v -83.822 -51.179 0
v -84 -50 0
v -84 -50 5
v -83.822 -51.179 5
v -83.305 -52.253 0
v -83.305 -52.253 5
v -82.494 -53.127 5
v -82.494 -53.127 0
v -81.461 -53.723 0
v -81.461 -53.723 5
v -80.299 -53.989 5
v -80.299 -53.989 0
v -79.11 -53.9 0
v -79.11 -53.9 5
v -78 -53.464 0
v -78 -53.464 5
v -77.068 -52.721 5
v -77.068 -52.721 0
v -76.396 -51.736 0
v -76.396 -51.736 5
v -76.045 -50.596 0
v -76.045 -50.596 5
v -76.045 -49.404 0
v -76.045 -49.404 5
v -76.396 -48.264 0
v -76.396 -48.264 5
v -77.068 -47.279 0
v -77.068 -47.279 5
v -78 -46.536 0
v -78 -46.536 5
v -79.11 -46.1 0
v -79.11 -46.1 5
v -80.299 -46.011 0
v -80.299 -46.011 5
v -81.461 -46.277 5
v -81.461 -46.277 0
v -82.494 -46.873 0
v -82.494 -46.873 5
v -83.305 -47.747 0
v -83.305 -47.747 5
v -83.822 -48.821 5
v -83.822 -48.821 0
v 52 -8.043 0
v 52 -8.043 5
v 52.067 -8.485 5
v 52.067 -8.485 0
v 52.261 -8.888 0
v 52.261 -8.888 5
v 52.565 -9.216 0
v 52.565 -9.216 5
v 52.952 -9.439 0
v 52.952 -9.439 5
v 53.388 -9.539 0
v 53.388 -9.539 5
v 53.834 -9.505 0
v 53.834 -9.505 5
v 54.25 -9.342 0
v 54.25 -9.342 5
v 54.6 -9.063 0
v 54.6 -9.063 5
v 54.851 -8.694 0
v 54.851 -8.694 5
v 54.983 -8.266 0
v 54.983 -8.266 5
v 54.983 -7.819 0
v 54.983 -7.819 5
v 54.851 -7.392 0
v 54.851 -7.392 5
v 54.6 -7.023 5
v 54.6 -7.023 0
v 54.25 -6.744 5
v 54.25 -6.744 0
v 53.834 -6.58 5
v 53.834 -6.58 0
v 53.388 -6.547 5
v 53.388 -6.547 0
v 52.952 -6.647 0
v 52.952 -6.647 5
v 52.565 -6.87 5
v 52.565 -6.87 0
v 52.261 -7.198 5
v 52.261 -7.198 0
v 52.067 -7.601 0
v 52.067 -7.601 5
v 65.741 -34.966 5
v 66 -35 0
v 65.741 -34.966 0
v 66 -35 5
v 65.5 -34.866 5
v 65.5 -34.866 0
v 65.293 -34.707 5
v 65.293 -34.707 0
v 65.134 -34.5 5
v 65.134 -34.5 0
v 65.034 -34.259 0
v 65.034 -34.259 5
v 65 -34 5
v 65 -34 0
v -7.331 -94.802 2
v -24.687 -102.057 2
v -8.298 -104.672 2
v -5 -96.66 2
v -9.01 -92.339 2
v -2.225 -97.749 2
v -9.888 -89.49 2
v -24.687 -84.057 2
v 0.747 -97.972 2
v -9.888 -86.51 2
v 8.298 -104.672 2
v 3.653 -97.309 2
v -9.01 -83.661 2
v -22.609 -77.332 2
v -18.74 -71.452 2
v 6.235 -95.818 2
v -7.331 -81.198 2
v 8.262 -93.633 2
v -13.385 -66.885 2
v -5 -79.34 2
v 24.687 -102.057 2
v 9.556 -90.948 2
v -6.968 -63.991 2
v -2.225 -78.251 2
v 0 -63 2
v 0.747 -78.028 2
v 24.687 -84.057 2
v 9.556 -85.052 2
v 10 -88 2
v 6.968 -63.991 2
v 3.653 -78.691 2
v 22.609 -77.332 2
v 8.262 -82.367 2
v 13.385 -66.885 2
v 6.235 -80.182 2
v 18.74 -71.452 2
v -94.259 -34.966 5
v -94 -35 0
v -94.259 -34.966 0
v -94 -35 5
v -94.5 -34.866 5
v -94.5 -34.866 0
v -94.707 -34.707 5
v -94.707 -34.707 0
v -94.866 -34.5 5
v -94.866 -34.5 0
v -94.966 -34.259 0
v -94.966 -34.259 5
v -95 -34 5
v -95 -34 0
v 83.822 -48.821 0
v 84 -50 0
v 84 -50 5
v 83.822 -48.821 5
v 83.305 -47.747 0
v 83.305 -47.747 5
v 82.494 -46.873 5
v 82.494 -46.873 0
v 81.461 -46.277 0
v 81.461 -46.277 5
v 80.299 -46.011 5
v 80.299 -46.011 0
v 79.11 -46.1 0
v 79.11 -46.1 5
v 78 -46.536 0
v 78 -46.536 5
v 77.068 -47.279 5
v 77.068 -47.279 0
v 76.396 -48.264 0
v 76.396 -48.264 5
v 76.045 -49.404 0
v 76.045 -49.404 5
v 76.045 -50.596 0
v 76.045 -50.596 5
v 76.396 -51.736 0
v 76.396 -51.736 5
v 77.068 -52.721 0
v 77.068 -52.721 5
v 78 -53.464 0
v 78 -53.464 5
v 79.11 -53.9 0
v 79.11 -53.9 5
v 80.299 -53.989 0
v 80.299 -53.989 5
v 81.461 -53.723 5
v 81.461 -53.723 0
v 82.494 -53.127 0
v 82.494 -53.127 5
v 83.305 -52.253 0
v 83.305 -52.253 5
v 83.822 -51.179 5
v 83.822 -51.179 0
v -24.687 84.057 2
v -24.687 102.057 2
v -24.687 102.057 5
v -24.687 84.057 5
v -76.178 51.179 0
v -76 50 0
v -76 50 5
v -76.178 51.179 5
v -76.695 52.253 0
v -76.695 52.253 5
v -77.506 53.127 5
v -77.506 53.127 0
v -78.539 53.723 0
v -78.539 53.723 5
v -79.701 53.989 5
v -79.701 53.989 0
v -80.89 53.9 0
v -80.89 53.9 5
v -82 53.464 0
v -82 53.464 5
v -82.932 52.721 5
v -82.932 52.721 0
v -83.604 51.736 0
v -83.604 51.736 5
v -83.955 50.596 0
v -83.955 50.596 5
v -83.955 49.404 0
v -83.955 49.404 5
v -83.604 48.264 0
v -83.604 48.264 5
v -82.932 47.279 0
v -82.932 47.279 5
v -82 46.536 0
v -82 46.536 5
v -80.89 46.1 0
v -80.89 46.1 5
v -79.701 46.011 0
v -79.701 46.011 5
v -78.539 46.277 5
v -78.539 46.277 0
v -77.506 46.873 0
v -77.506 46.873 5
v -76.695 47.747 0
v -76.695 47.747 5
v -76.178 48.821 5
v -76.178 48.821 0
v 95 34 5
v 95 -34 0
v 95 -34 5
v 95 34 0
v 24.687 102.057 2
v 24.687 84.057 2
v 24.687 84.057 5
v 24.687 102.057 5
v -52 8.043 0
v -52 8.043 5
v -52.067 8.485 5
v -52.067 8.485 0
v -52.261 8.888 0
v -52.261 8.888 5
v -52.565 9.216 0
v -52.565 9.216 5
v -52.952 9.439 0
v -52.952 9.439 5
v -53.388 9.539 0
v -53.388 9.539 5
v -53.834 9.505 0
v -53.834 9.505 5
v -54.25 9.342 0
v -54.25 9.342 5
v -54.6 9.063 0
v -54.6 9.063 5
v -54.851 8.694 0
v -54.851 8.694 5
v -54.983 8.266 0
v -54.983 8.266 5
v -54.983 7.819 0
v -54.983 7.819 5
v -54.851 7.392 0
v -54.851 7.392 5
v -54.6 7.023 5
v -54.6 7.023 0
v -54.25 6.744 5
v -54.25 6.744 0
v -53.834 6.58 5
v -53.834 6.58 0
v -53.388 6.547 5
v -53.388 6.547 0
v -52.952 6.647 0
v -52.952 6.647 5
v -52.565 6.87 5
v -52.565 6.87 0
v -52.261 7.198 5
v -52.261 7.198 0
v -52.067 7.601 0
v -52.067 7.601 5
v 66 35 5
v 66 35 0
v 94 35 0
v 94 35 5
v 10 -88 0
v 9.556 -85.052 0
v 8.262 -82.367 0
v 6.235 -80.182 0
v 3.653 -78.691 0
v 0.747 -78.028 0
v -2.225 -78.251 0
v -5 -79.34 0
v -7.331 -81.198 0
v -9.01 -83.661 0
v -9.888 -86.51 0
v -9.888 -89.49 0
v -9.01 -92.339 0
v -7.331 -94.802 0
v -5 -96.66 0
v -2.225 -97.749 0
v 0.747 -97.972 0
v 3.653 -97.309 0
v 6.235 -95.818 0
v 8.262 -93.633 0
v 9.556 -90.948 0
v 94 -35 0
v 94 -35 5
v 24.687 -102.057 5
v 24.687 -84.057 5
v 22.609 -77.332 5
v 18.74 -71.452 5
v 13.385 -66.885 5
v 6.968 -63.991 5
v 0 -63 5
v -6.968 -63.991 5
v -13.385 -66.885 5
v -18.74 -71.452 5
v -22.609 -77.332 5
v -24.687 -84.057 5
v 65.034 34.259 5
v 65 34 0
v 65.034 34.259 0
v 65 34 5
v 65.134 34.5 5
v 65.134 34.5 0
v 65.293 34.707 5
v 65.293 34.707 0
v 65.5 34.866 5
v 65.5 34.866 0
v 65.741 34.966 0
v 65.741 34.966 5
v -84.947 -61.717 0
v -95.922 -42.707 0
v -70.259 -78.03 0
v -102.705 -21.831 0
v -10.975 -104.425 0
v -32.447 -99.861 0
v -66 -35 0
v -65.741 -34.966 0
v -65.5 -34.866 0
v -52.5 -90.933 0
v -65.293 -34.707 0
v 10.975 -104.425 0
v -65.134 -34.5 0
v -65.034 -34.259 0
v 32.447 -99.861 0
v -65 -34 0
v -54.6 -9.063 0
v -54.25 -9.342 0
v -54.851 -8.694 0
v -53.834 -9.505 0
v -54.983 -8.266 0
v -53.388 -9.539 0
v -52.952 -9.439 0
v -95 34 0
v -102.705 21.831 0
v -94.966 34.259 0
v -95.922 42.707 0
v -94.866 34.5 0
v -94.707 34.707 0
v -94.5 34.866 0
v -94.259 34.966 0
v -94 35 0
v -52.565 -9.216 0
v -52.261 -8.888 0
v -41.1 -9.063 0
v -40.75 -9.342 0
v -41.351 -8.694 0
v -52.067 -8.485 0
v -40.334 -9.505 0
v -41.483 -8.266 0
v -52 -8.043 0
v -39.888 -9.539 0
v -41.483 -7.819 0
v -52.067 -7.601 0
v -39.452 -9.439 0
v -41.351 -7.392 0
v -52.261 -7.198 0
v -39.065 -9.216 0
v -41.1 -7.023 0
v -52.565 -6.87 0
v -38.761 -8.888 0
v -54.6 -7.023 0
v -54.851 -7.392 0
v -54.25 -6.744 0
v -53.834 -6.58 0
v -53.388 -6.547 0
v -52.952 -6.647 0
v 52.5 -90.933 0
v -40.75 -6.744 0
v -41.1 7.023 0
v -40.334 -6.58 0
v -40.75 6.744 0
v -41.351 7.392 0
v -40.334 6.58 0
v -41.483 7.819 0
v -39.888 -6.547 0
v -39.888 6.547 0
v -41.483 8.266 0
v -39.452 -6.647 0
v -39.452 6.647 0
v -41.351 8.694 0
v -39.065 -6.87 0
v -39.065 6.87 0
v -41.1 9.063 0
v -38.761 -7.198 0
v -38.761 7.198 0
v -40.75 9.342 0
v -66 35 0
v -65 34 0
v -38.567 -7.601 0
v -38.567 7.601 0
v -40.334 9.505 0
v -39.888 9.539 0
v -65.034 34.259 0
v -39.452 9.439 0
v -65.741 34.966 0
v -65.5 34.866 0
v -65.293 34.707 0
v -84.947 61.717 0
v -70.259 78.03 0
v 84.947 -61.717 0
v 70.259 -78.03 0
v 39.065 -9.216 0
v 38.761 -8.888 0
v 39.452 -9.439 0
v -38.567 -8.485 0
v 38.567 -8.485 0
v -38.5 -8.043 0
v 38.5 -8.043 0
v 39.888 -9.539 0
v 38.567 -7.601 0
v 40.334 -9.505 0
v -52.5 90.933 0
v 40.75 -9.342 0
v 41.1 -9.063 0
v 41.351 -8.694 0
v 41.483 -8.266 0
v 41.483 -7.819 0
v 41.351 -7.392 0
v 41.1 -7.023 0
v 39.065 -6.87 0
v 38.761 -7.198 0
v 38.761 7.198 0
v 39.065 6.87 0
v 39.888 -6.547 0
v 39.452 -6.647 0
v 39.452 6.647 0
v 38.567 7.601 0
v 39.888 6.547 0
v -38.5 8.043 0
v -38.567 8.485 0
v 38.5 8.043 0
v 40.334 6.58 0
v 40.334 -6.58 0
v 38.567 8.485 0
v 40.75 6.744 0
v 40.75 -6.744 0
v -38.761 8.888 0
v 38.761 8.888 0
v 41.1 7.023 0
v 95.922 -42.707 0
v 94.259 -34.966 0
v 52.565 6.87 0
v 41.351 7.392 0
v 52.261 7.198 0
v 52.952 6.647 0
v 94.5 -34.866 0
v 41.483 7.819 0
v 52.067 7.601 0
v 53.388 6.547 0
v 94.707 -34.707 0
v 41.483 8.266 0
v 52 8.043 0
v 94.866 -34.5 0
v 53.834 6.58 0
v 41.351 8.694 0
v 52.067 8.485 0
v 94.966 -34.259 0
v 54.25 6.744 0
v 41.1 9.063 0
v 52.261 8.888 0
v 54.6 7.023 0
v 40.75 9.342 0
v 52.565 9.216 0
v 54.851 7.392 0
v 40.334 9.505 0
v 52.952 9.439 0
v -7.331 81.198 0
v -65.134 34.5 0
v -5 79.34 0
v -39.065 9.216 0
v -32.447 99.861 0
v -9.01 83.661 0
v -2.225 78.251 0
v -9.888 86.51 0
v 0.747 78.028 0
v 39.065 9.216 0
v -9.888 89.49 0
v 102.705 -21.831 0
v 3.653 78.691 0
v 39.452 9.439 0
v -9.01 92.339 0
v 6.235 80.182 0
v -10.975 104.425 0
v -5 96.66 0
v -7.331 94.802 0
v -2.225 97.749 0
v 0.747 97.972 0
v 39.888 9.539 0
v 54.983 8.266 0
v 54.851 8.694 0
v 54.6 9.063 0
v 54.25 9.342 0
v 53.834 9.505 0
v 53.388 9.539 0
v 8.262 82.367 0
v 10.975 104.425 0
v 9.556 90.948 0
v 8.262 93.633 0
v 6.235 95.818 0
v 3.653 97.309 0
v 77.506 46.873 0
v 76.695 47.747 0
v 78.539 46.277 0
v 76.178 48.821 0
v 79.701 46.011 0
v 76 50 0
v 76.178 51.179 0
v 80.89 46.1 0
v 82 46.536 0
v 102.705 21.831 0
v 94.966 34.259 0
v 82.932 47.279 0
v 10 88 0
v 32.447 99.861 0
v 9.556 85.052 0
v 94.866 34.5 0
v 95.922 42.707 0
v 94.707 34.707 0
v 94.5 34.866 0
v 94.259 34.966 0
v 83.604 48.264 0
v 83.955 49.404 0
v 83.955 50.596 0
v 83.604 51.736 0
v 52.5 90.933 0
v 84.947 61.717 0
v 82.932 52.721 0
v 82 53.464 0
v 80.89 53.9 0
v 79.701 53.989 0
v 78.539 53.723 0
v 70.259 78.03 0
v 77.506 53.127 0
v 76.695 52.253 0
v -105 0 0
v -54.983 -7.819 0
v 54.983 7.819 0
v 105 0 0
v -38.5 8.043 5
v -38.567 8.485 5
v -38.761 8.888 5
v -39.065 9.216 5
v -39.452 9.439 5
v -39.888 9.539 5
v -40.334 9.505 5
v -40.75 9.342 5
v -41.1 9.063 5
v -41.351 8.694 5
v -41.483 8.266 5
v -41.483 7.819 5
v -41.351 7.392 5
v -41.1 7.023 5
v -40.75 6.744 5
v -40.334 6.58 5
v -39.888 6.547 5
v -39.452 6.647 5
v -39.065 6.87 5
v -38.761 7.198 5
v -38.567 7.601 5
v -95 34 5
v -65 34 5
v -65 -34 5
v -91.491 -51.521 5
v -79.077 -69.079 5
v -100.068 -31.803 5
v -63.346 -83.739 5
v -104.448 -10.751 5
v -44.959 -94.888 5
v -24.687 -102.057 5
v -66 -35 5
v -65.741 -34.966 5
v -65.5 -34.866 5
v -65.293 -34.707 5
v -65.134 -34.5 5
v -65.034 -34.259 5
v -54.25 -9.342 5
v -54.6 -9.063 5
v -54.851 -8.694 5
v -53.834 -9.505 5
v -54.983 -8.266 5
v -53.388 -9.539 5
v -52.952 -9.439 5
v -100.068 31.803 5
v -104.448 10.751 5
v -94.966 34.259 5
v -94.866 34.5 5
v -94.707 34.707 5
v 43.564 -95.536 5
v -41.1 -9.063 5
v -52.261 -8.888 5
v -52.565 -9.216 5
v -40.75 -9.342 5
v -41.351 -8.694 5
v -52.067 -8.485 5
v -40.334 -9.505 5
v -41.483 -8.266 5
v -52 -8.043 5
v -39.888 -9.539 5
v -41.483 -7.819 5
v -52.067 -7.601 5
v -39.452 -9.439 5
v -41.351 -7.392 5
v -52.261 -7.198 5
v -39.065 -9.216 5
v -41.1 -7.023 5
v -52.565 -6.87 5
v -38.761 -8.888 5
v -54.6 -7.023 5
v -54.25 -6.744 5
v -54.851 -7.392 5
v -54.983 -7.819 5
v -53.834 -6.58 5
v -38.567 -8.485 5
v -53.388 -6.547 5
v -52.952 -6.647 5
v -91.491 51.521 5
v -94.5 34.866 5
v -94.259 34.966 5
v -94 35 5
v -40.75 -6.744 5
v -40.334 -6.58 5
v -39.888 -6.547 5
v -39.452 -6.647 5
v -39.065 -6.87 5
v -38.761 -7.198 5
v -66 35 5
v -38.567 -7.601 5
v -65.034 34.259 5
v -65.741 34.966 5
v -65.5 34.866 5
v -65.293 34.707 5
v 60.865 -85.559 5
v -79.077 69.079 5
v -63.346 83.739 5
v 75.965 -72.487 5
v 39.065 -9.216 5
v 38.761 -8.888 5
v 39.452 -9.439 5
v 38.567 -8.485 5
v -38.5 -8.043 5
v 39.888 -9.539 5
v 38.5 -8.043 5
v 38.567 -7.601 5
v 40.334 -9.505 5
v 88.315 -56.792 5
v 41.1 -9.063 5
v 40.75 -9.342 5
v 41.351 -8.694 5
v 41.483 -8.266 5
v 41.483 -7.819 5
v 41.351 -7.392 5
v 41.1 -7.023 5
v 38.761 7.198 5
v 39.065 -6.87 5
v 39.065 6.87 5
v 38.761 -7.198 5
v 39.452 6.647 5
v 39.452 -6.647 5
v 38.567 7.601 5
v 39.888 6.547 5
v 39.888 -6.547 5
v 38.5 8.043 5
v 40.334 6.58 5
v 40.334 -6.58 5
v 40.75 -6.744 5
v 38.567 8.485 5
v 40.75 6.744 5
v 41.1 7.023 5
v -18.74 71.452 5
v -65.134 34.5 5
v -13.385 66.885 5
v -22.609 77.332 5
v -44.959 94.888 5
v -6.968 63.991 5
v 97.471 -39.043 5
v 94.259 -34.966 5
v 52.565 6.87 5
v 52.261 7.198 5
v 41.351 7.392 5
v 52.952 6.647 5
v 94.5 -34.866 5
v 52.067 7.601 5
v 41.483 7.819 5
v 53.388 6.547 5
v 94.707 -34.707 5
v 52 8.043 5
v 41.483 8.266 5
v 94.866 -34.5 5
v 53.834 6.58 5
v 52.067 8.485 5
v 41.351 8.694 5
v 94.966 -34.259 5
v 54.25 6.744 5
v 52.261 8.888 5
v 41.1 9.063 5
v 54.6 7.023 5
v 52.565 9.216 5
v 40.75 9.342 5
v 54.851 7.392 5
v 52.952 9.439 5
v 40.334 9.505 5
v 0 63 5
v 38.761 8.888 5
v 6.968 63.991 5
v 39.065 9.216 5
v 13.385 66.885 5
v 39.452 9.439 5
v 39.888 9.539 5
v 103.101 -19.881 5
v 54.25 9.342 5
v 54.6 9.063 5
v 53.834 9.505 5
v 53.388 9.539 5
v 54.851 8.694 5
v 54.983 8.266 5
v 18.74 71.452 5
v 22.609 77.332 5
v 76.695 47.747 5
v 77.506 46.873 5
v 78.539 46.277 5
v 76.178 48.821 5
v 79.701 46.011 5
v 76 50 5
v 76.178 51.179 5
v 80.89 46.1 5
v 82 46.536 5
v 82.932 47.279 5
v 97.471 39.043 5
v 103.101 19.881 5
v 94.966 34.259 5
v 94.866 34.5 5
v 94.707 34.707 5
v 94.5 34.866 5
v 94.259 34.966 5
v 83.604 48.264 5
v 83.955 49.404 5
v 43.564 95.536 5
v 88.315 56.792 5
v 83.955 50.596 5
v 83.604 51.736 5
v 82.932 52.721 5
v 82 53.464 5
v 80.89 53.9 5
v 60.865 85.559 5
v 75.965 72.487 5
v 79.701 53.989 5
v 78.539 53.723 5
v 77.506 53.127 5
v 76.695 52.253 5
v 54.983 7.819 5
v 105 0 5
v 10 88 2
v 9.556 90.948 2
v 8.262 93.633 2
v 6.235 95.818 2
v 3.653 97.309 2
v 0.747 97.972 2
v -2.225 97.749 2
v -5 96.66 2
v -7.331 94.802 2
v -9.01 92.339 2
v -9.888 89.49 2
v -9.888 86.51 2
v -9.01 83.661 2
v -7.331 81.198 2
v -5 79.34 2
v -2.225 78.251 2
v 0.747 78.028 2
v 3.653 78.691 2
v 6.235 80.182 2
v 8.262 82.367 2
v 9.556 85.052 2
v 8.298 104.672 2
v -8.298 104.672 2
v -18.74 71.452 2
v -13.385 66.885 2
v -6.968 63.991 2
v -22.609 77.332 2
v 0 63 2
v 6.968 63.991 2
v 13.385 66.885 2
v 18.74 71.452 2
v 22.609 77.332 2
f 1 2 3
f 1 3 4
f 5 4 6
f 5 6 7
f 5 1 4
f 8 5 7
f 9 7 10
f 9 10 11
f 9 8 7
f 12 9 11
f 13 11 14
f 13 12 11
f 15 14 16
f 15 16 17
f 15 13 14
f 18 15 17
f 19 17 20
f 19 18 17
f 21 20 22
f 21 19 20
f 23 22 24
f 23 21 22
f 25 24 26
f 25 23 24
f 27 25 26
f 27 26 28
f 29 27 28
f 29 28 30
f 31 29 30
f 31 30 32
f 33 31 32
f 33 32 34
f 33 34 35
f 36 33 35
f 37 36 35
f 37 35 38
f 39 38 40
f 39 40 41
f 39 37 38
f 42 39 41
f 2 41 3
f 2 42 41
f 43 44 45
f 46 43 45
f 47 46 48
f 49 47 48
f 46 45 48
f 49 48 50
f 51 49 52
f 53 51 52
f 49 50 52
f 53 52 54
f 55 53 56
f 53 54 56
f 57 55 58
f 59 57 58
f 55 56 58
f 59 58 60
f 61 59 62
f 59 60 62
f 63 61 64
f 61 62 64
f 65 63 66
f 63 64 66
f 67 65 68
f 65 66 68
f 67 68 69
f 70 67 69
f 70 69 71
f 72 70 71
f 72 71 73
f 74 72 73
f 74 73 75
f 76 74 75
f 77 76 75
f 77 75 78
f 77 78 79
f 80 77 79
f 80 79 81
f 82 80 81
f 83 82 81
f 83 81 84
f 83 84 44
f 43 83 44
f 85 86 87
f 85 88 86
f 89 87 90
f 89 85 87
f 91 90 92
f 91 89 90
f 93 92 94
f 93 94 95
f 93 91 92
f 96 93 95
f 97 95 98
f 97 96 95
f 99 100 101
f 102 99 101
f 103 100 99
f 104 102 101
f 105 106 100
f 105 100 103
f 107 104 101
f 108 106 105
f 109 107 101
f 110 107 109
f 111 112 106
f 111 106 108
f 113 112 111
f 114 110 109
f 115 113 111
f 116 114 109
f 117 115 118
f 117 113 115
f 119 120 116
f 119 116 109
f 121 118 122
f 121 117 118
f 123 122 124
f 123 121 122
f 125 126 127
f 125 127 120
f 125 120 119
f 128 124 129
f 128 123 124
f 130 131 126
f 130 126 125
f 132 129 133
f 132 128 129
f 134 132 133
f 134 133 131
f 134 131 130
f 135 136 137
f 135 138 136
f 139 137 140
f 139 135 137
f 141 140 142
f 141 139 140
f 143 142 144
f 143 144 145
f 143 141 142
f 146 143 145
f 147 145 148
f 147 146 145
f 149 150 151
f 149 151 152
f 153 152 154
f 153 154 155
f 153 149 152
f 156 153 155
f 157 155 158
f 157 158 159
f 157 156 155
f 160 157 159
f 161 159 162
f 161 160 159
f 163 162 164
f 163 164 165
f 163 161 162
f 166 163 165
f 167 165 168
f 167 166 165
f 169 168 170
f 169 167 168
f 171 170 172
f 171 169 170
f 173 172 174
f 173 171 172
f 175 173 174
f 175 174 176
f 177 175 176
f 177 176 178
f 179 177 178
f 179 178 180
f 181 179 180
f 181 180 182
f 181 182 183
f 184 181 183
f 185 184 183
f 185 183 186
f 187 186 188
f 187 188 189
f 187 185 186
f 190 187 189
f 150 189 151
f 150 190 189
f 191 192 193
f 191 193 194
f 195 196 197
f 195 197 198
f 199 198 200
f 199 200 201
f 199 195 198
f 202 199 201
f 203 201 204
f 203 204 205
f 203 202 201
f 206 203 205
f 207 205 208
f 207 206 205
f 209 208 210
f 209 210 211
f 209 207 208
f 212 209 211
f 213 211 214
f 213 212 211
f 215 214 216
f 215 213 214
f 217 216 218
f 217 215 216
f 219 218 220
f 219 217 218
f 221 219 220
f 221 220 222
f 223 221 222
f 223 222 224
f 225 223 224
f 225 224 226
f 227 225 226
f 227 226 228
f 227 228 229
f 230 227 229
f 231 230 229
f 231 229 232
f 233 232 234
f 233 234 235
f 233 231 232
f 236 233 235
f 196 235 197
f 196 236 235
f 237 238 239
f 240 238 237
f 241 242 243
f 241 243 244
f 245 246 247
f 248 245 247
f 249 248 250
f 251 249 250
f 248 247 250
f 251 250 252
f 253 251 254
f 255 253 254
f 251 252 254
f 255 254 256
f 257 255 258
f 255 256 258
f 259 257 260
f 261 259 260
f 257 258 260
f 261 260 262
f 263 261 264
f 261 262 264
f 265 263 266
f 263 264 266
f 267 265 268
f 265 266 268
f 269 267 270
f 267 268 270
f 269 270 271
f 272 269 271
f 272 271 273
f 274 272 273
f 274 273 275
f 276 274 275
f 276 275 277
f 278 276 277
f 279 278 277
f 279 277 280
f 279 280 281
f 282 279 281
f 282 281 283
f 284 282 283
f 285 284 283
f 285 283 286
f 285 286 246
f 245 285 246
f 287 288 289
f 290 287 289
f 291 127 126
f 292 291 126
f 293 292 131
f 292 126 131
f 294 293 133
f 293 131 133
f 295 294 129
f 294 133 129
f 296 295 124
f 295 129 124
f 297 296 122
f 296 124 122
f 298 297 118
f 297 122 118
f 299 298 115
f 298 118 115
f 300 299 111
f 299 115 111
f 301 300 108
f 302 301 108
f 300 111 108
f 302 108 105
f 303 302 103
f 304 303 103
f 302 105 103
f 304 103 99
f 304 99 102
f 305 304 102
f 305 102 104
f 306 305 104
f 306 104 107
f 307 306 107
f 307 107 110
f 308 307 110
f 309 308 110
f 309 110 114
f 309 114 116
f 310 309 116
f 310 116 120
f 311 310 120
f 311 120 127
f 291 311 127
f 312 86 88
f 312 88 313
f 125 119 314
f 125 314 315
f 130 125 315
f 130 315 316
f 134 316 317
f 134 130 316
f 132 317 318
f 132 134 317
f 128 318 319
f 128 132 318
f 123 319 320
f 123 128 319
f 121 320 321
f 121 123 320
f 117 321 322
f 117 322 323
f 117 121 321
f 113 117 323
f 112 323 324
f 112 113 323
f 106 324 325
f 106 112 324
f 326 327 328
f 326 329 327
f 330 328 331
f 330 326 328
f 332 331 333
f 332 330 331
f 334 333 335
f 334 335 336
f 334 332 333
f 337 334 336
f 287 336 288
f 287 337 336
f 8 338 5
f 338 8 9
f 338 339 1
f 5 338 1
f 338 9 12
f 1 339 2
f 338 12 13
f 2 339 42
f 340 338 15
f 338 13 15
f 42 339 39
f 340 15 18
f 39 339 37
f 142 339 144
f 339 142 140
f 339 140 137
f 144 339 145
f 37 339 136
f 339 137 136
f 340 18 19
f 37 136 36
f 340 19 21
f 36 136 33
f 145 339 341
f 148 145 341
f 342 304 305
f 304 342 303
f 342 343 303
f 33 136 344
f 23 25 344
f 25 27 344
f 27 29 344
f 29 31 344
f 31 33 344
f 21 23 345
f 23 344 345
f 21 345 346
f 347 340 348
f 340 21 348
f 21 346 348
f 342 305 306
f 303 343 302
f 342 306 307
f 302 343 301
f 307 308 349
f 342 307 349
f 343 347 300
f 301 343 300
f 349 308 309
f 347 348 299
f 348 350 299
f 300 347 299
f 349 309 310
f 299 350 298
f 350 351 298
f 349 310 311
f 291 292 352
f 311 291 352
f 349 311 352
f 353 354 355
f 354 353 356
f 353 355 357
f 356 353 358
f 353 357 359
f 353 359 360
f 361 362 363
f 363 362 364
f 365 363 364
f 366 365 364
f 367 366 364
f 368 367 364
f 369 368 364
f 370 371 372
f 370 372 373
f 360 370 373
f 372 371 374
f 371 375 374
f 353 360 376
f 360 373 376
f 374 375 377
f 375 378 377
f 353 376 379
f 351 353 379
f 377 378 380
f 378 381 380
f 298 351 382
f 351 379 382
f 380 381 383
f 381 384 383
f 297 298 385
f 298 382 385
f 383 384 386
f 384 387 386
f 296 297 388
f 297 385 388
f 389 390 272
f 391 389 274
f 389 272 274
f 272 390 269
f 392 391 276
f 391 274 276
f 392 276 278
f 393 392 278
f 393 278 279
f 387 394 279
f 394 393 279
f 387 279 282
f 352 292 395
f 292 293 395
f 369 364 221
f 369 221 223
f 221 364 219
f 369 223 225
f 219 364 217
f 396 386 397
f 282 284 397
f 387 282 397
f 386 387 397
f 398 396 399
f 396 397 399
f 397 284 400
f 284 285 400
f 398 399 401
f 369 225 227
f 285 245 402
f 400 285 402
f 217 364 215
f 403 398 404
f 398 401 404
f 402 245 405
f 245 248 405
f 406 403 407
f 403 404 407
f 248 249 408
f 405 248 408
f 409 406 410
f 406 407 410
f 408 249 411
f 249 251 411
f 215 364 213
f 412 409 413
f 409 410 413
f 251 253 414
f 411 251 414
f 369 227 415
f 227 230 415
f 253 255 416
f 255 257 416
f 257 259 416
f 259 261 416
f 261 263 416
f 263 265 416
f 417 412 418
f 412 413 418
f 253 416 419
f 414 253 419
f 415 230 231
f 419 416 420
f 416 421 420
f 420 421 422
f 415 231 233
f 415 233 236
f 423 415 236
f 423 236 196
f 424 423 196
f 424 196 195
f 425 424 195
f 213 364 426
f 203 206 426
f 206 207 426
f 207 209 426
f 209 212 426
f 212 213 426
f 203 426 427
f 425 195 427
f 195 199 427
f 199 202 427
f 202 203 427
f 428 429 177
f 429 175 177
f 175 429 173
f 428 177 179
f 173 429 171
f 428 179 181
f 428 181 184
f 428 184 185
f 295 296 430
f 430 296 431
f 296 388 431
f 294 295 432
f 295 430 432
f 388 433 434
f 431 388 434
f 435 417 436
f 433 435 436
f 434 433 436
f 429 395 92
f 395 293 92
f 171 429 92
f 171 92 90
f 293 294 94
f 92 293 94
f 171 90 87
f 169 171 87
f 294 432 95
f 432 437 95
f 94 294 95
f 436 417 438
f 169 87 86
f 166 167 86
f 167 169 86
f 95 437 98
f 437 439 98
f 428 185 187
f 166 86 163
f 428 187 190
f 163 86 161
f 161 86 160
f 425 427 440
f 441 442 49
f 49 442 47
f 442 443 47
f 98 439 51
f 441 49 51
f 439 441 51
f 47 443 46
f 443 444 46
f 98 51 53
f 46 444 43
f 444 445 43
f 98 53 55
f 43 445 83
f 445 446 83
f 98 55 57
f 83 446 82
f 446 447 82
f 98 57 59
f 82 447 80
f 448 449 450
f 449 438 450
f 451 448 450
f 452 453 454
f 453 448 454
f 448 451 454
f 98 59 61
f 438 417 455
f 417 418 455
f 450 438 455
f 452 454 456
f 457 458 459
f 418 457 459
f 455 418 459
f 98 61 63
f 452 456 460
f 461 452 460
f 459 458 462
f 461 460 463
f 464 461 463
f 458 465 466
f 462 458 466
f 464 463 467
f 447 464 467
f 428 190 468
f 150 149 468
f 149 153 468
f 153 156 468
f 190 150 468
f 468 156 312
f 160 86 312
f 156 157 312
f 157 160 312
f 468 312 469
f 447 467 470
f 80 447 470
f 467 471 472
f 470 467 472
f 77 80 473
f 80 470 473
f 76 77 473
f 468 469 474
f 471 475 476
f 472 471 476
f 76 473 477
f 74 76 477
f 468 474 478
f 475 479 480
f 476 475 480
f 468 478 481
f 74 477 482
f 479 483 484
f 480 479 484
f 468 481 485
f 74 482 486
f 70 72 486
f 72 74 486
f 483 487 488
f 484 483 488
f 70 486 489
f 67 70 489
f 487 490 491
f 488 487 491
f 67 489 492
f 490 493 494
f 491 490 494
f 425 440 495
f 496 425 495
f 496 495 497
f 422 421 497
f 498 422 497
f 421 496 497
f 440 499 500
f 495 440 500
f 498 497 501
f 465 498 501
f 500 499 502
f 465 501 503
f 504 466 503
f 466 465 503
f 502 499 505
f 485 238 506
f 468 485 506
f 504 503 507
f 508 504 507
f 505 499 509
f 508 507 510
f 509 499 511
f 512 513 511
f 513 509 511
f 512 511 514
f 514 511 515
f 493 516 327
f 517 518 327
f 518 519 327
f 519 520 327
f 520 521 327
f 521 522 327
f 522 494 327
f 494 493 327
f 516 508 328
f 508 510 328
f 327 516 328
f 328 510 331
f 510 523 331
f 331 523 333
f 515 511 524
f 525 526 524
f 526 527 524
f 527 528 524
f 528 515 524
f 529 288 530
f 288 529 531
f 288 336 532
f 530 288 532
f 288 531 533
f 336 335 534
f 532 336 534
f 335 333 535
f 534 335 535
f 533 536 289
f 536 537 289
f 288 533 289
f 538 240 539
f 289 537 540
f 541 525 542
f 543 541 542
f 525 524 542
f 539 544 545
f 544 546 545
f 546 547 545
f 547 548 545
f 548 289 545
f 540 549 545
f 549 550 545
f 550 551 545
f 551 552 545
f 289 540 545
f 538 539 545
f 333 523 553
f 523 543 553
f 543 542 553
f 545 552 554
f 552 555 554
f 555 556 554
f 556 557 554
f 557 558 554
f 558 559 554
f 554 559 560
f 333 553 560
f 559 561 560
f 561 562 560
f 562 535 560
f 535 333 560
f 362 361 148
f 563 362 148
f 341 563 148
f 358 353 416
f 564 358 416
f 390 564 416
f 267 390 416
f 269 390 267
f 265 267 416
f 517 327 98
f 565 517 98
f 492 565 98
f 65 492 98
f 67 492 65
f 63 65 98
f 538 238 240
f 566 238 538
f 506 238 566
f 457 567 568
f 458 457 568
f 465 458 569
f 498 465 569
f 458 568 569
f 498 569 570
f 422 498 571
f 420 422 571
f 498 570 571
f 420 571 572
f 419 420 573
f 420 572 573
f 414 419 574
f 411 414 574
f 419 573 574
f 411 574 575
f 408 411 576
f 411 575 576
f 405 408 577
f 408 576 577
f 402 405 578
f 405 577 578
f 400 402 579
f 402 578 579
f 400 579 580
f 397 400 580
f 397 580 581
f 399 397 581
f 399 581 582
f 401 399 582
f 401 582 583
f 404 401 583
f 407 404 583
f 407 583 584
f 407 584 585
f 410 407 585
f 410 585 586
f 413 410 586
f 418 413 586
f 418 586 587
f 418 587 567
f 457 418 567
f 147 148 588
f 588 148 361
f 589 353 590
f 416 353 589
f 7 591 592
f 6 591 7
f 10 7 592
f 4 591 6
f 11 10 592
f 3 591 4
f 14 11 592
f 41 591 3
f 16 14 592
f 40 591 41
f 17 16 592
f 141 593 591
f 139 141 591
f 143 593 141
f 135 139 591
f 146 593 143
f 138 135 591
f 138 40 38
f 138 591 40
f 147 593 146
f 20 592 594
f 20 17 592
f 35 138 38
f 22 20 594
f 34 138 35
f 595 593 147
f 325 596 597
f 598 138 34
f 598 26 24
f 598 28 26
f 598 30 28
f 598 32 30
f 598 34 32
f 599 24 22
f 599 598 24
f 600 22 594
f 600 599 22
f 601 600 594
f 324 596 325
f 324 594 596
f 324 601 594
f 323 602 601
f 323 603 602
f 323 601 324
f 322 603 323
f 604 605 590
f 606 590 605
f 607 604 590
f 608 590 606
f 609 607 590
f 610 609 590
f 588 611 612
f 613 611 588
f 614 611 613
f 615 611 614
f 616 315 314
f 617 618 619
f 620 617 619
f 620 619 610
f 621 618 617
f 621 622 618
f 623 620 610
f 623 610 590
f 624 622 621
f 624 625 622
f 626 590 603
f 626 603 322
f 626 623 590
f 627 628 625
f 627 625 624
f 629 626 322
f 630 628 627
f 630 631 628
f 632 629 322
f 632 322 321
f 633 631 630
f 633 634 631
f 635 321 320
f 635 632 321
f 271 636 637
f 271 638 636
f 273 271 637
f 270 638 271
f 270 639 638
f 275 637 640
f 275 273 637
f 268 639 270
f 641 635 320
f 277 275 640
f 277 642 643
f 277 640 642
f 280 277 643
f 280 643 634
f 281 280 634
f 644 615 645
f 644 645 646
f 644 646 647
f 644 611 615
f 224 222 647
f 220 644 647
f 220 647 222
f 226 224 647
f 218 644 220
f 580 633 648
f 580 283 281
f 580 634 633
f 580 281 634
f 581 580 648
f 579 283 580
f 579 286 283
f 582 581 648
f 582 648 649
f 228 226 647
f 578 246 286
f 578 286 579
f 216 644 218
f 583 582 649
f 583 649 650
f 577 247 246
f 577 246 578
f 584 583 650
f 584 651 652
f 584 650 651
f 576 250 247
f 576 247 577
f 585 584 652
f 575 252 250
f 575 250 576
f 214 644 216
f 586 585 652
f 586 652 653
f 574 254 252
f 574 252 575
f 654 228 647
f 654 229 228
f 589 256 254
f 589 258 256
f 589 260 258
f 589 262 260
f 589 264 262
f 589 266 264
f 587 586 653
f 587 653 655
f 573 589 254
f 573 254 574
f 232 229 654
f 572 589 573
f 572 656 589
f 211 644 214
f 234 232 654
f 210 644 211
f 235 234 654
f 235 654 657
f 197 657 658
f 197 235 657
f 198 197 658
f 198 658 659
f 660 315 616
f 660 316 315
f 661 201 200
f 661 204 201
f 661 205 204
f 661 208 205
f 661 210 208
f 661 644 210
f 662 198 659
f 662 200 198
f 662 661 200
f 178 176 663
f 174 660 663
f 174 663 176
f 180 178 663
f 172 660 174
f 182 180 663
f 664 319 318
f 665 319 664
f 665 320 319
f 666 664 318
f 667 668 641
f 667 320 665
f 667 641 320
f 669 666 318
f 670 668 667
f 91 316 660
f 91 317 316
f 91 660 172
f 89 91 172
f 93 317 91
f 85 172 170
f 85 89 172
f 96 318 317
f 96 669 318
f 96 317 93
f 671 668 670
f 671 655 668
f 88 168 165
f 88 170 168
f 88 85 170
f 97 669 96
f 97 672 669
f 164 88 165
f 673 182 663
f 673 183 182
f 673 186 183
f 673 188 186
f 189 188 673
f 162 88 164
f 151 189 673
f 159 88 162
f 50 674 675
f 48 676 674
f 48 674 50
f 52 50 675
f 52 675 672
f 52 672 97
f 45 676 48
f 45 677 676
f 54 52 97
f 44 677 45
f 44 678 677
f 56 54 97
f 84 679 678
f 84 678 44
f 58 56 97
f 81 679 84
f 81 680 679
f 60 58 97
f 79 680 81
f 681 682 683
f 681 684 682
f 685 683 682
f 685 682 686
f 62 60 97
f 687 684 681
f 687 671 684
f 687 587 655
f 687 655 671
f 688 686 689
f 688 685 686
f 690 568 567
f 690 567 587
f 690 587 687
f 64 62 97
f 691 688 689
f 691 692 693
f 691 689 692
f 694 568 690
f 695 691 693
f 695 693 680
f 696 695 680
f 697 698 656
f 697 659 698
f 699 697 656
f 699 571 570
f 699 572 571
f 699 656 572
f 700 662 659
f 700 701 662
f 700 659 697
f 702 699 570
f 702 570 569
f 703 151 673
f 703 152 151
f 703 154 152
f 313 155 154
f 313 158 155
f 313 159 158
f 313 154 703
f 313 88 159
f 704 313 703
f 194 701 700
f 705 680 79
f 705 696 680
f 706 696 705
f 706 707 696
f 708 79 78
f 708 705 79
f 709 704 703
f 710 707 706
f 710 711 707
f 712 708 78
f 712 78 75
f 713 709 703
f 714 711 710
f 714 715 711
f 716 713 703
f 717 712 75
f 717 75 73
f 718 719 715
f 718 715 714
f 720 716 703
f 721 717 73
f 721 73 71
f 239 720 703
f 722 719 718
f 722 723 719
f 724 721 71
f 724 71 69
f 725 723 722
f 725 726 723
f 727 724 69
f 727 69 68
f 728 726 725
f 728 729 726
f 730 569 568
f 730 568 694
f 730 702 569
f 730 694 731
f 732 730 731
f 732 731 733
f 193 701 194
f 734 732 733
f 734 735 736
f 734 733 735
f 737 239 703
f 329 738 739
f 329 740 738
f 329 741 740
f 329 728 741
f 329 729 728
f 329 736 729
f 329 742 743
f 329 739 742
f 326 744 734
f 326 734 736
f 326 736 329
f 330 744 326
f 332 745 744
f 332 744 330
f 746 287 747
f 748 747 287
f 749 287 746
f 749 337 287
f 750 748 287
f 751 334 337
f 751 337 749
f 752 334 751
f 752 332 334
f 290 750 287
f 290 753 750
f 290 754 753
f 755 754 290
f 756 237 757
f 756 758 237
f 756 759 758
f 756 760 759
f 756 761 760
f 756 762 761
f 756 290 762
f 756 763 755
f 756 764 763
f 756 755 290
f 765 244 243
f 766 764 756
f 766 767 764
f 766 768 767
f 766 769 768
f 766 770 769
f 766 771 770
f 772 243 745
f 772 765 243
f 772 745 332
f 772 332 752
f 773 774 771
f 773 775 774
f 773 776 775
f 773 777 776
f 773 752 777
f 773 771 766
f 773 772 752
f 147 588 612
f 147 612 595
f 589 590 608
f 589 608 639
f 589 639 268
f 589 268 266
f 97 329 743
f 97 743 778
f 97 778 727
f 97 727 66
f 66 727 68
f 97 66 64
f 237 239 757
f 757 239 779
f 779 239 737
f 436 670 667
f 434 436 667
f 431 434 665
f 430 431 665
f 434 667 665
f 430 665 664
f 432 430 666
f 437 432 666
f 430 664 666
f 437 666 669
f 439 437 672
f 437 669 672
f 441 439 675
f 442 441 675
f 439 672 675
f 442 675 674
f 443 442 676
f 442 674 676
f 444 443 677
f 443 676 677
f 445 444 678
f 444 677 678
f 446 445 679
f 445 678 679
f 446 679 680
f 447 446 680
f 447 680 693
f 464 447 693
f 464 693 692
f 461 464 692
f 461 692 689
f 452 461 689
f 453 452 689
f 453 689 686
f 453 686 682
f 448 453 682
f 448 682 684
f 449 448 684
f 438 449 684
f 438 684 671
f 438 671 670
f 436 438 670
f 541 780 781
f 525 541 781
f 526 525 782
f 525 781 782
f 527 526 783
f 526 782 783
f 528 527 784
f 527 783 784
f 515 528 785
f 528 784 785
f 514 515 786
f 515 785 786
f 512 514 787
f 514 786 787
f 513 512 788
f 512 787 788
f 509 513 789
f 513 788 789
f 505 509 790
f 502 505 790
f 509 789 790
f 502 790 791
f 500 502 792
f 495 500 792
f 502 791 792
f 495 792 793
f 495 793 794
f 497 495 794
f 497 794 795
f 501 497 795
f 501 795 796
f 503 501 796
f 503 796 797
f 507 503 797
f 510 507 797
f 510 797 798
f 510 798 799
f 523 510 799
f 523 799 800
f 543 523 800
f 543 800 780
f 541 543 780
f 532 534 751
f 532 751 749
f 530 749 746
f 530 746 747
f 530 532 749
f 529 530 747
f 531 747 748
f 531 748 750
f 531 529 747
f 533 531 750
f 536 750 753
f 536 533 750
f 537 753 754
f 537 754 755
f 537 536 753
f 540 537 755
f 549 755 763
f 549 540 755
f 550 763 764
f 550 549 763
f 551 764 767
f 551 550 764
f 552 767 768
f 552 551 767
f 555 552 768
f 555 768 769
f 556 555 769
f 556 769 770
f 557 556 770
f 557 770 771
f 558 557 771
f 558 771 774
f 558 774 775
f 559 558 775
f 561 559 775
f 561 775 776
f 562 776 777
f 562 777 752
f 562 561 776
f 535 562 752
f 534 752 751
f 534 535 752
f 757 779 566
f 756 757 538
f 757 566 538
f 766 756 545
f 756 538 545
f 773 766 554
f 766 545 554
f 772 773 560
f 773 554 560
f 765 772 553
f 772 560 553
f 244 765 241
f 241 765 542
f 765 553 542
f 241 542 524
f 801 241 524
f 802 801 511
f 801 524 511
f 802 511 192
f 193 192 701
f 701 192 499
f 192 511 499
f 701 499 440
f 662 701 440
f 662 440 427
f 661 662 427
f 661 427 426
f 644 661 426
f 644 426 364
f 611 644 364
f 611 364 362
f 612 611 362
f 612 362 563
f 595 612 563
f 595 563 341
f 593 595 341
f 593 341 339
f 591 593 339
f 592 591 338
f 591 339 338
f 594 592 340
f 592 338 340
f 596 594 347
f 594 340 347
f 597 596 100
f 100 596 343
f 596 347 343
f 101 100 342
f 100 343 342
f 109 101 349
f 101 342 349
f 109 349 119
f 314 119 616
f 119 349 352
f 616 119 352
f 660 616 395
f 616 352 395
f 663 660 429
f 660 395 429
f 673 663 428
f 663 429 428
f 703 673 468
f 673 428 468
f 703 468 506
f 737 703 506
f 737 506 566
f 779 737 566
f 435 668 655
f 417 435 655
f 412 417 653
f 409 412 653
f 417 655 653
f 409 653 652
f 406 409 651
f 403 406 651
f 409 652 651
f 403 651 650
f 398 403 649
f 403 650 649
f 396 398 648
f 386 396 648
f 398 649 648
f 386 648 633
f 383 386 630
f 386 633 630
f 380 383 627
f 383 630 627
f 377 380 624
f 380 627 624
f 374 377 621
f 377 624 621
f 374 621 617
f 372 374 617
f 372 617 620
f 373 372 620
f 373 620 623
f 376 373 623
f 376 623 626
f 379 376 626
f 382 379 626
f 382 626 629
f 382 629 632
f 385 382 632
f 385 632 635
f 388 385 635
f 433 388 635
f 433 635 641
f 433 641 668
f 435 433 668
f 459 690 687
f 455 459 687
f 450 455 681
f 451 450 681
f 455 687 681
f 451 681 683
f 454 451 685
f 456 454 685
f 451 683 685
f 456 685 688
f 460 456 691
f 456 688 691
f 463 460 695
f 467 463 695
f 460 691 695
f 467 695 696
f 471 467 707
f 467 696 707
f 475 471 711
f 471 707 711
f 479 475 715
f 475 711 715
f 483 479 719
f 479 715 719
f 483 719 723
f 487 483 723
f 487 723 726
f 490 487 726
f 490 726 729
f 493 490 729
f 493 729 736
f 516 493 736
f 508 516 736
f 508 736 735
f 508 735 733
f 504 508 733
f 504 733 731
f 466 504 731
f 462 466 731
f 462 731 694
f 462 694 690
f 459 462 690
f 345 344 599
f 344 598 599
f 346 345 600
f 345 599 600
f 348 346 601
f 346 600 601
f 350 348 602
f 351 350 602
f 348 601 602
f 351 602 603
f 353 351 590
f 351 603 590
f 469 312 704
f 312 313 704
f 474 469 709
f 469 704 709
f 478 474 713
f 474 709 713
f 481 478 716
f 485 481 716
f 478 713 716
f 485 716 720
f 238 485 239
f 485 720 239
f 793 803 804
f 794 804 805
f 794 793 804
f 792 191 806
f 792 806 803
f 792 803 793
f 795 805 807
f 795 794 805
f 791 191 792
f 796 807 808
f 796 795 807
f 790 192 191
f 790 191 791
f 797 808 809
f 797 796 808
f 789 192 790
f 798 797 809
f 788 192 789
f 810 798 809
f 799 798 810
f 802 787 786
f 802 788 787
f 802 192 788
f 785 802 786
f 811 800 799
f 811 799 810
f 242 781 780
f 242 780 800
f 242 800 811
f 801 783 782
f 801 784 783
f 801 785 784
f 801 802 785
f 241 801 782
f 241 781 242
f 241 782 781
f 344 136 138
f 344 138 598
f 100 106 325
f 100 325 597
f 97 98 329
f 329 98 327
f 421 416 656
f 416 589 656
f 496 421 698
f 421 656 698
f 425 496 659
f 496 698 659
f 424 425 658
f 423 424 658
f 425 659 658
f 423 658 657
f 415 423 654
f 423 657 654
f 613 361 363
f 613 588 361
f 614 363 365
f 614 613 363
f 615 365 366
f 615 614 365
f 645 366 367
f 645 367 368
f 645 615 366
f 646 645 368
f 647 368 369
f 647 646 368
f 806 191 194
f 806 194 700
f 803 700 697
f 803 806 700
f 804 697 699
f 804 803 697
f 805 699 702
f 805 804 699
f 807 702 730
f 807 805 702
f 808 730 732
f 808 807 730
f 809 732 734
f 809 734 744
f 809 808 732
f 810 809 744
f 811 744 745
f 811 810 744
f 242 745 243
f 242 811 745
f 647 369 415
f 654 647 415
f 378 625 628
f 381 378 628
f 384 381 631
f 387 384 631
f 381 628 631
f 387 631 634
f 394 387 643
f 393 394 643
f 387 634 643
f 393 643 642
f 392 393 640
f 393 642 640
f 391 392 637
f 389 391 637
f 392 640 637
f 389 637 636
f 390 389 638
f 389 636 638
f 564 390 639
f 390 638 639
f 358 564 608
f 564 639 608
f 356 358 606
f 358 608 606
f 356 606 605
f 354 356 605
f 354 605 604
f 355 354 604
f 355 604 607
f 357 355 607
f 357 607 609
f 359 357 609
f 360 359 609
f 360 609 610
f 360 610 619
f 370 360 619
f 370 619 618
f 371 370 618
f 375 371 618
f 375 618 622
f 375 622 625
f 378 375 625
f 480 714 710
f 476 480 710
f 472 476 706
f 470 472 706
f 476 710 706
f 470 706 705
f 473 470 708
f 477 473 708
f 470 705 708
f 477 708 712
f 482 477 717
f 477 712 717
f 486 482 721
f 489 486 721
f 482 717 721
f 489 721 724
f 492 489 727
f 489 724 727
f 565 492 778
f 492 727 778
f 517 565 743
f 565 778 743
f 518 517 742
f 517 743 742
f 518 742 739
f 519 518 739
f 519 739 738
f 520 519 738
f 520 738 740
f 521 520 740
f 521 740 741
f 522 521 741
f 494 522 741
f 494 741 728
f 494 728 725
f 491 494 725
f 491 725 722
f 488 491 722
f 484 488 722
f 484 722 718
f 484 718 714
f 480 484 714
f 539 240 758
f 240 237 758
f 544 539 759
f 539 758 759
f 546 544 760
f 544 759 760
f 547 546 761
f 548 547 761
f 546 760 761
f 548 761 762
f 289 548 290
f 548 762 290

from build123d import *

# Parameters (mm, degrees)
ESQUISSE1_R             = 105
ESQUISSE1_R_2           = 4
ESQUISSE1_W             = 30
ESQUISSE1_H             = 70
BOSS_EXTRU_1_DEPTH      = 5
ESQUISSE2_R             = 1.5
ENL_V_MAT_EXTRU_1_DEPTH = 149.576579581
CONG_1_R                = 1
ENL_V_START             = -3
ENL_V_MAT_EXTRU_2_DEPTH = 3
ESQUISSE4_R             = 10
ENL_V_MAT_EXTRU_3_DEPTH = 149.576579581


with BuildPart() as part:
    # Esquisse1 → Boss.-Extru.1 (new body)
    with BuildSketch(Plane.XY):
        Circle(ESQUISSE1_R)
        with Locations((-80, 50)):
            Circle(ESQUISSE1_R_2, mode=Mode.SUBTRACT)
        with Locations(Location((80, 50, 0), (0, 0, 180))):
            Circle(ESQUISSE1_R_2, mode=Mode.SUBTRACT)
        with Locations((80, -50)):
            Circle(ESQUISSE1_R_2, mode=Mode.SUBTRACT)
        with Locations(Location((-80, -50, 0), (0, 0, 180))):
            Circle(ESQUISSE1_R_2, mode=Mode.SUBTRACT)
        with Locations((-80, 0)):
            Rectangle(ESQUISSE1_W, ESQUISSE1_H, mode=Mode.SUBTRACT)
        with Locations((80, 0)):
            Rectangle(ESQUISSE1_W, ESQUISSE1_H, mode=Mode.SUBTRACT)
    extrude(amount=BOSS_EXTRU_1_DEPTH)

    # Esquisse2 → Enlèv. mat.-Extru.1 (cut, through all)
    with BuildSketch(Plane.XY.offset(5)):
        with Locations((-53.5, -8.042853971)):
            Circle(ESQUISSE2_R)
        with Locations((-40, -8.042853971)):
            Circle(ESQUISSE2_R)
        with Locations((-53.5, 8.042853971)):
            Circle(ESQUISSE2_R)
        with Locations((-40, 8.042853971)):
            Circle(ESQUISSE2_R)
        with Locations(Location((40, 8.042853971, 0), (0, 0, 180))):
            Circle(ESQUISSE2_R)
        with Locations(Location((53.5, 8.042853971, 0), (0, 0, 180))):
            Circle(ESQUISSE2_R)
        with Locations(Location((40, -8.042853971, 0), (0, 0, 180))):
            Circle(ESQUISSE2_R)
        with Locations(Location((53.5, -8.042853971, 0), (0, 0, 180))):
            Circle(ESQUISSE2_R)
    extrude(amount=-ENL_V_MAT_EXTRU_1_DEPTH, mode=Mode.SUBTRACT)

    # Congé1
    cong_1_edges = [part.edges().sort_by_distance(p)[0] for p in [
        (95, -35, 2.5),
        (95, 35, 2.5),
        (65, 35, 2.5),
        (65, -35, 2.5),
        (-65, -35, 2.5),
        (-65, 35, 2.5),
        (-95, 35, 2.5),
        (-95, -35, 2.5),
    ]]
    fillet(cong_1_edges, radius=CONG_1_R)

    # Esquisse3 → Enlèv. mat.-Extru.2 (cut)
    with BuildSketch(Plane.XY.offset(5).offset(ENL_V_START)):
        with BuildLine():
            ThreePointArc((24.687033564, 102.056603774), (0, 105), (-24.687033564, 102.056603774))
            Line((-24.687033564, 102.056603774), (-24.687033564, 84.056603774))
            ThreePointArc((-24.687033564, 84.056603774), (0, 63), (24.687033564, 84.056603774))
            Line((24.687033564, 84.056603774), (24.687033564, 102.056603774))
        make_face()
        with BuildLine():
            ThreePointArc((24.687033564, -84.056603774), (0, -63), (-24.687033564, -84.056603774))
            Line((-24.687033564, -84.056603774), (-24.687033564, -102.056603774))
            ThreePointArc((-24.687033564, -102.056603774), (0, -105), (24.687033564, -102.056603774))
            Line((24.687033564, -102.056603774), (24.687033564, -84.056603774))
        make_face()
    extrude(amount=ENL_V_MAT_EXTRU_2_DEPTH, mode=Mode.SUBTRACT)

    # Esquisse4 → Enlèv. mat.-Extru.3 (cut, through all)
    with BuildSketch(Plane.XY.offset(5)):
        with Locations((0, 88)):
            Circle(ESQUISSE4_R)
        with Locations((0, -88)):
            Circle(ESQUISSE4_R)
    extrude(amount=-ENL_V_MAT_EXTRU_3_DEPTH, mode=Mode.SUBTRACT)


solid = part.part
